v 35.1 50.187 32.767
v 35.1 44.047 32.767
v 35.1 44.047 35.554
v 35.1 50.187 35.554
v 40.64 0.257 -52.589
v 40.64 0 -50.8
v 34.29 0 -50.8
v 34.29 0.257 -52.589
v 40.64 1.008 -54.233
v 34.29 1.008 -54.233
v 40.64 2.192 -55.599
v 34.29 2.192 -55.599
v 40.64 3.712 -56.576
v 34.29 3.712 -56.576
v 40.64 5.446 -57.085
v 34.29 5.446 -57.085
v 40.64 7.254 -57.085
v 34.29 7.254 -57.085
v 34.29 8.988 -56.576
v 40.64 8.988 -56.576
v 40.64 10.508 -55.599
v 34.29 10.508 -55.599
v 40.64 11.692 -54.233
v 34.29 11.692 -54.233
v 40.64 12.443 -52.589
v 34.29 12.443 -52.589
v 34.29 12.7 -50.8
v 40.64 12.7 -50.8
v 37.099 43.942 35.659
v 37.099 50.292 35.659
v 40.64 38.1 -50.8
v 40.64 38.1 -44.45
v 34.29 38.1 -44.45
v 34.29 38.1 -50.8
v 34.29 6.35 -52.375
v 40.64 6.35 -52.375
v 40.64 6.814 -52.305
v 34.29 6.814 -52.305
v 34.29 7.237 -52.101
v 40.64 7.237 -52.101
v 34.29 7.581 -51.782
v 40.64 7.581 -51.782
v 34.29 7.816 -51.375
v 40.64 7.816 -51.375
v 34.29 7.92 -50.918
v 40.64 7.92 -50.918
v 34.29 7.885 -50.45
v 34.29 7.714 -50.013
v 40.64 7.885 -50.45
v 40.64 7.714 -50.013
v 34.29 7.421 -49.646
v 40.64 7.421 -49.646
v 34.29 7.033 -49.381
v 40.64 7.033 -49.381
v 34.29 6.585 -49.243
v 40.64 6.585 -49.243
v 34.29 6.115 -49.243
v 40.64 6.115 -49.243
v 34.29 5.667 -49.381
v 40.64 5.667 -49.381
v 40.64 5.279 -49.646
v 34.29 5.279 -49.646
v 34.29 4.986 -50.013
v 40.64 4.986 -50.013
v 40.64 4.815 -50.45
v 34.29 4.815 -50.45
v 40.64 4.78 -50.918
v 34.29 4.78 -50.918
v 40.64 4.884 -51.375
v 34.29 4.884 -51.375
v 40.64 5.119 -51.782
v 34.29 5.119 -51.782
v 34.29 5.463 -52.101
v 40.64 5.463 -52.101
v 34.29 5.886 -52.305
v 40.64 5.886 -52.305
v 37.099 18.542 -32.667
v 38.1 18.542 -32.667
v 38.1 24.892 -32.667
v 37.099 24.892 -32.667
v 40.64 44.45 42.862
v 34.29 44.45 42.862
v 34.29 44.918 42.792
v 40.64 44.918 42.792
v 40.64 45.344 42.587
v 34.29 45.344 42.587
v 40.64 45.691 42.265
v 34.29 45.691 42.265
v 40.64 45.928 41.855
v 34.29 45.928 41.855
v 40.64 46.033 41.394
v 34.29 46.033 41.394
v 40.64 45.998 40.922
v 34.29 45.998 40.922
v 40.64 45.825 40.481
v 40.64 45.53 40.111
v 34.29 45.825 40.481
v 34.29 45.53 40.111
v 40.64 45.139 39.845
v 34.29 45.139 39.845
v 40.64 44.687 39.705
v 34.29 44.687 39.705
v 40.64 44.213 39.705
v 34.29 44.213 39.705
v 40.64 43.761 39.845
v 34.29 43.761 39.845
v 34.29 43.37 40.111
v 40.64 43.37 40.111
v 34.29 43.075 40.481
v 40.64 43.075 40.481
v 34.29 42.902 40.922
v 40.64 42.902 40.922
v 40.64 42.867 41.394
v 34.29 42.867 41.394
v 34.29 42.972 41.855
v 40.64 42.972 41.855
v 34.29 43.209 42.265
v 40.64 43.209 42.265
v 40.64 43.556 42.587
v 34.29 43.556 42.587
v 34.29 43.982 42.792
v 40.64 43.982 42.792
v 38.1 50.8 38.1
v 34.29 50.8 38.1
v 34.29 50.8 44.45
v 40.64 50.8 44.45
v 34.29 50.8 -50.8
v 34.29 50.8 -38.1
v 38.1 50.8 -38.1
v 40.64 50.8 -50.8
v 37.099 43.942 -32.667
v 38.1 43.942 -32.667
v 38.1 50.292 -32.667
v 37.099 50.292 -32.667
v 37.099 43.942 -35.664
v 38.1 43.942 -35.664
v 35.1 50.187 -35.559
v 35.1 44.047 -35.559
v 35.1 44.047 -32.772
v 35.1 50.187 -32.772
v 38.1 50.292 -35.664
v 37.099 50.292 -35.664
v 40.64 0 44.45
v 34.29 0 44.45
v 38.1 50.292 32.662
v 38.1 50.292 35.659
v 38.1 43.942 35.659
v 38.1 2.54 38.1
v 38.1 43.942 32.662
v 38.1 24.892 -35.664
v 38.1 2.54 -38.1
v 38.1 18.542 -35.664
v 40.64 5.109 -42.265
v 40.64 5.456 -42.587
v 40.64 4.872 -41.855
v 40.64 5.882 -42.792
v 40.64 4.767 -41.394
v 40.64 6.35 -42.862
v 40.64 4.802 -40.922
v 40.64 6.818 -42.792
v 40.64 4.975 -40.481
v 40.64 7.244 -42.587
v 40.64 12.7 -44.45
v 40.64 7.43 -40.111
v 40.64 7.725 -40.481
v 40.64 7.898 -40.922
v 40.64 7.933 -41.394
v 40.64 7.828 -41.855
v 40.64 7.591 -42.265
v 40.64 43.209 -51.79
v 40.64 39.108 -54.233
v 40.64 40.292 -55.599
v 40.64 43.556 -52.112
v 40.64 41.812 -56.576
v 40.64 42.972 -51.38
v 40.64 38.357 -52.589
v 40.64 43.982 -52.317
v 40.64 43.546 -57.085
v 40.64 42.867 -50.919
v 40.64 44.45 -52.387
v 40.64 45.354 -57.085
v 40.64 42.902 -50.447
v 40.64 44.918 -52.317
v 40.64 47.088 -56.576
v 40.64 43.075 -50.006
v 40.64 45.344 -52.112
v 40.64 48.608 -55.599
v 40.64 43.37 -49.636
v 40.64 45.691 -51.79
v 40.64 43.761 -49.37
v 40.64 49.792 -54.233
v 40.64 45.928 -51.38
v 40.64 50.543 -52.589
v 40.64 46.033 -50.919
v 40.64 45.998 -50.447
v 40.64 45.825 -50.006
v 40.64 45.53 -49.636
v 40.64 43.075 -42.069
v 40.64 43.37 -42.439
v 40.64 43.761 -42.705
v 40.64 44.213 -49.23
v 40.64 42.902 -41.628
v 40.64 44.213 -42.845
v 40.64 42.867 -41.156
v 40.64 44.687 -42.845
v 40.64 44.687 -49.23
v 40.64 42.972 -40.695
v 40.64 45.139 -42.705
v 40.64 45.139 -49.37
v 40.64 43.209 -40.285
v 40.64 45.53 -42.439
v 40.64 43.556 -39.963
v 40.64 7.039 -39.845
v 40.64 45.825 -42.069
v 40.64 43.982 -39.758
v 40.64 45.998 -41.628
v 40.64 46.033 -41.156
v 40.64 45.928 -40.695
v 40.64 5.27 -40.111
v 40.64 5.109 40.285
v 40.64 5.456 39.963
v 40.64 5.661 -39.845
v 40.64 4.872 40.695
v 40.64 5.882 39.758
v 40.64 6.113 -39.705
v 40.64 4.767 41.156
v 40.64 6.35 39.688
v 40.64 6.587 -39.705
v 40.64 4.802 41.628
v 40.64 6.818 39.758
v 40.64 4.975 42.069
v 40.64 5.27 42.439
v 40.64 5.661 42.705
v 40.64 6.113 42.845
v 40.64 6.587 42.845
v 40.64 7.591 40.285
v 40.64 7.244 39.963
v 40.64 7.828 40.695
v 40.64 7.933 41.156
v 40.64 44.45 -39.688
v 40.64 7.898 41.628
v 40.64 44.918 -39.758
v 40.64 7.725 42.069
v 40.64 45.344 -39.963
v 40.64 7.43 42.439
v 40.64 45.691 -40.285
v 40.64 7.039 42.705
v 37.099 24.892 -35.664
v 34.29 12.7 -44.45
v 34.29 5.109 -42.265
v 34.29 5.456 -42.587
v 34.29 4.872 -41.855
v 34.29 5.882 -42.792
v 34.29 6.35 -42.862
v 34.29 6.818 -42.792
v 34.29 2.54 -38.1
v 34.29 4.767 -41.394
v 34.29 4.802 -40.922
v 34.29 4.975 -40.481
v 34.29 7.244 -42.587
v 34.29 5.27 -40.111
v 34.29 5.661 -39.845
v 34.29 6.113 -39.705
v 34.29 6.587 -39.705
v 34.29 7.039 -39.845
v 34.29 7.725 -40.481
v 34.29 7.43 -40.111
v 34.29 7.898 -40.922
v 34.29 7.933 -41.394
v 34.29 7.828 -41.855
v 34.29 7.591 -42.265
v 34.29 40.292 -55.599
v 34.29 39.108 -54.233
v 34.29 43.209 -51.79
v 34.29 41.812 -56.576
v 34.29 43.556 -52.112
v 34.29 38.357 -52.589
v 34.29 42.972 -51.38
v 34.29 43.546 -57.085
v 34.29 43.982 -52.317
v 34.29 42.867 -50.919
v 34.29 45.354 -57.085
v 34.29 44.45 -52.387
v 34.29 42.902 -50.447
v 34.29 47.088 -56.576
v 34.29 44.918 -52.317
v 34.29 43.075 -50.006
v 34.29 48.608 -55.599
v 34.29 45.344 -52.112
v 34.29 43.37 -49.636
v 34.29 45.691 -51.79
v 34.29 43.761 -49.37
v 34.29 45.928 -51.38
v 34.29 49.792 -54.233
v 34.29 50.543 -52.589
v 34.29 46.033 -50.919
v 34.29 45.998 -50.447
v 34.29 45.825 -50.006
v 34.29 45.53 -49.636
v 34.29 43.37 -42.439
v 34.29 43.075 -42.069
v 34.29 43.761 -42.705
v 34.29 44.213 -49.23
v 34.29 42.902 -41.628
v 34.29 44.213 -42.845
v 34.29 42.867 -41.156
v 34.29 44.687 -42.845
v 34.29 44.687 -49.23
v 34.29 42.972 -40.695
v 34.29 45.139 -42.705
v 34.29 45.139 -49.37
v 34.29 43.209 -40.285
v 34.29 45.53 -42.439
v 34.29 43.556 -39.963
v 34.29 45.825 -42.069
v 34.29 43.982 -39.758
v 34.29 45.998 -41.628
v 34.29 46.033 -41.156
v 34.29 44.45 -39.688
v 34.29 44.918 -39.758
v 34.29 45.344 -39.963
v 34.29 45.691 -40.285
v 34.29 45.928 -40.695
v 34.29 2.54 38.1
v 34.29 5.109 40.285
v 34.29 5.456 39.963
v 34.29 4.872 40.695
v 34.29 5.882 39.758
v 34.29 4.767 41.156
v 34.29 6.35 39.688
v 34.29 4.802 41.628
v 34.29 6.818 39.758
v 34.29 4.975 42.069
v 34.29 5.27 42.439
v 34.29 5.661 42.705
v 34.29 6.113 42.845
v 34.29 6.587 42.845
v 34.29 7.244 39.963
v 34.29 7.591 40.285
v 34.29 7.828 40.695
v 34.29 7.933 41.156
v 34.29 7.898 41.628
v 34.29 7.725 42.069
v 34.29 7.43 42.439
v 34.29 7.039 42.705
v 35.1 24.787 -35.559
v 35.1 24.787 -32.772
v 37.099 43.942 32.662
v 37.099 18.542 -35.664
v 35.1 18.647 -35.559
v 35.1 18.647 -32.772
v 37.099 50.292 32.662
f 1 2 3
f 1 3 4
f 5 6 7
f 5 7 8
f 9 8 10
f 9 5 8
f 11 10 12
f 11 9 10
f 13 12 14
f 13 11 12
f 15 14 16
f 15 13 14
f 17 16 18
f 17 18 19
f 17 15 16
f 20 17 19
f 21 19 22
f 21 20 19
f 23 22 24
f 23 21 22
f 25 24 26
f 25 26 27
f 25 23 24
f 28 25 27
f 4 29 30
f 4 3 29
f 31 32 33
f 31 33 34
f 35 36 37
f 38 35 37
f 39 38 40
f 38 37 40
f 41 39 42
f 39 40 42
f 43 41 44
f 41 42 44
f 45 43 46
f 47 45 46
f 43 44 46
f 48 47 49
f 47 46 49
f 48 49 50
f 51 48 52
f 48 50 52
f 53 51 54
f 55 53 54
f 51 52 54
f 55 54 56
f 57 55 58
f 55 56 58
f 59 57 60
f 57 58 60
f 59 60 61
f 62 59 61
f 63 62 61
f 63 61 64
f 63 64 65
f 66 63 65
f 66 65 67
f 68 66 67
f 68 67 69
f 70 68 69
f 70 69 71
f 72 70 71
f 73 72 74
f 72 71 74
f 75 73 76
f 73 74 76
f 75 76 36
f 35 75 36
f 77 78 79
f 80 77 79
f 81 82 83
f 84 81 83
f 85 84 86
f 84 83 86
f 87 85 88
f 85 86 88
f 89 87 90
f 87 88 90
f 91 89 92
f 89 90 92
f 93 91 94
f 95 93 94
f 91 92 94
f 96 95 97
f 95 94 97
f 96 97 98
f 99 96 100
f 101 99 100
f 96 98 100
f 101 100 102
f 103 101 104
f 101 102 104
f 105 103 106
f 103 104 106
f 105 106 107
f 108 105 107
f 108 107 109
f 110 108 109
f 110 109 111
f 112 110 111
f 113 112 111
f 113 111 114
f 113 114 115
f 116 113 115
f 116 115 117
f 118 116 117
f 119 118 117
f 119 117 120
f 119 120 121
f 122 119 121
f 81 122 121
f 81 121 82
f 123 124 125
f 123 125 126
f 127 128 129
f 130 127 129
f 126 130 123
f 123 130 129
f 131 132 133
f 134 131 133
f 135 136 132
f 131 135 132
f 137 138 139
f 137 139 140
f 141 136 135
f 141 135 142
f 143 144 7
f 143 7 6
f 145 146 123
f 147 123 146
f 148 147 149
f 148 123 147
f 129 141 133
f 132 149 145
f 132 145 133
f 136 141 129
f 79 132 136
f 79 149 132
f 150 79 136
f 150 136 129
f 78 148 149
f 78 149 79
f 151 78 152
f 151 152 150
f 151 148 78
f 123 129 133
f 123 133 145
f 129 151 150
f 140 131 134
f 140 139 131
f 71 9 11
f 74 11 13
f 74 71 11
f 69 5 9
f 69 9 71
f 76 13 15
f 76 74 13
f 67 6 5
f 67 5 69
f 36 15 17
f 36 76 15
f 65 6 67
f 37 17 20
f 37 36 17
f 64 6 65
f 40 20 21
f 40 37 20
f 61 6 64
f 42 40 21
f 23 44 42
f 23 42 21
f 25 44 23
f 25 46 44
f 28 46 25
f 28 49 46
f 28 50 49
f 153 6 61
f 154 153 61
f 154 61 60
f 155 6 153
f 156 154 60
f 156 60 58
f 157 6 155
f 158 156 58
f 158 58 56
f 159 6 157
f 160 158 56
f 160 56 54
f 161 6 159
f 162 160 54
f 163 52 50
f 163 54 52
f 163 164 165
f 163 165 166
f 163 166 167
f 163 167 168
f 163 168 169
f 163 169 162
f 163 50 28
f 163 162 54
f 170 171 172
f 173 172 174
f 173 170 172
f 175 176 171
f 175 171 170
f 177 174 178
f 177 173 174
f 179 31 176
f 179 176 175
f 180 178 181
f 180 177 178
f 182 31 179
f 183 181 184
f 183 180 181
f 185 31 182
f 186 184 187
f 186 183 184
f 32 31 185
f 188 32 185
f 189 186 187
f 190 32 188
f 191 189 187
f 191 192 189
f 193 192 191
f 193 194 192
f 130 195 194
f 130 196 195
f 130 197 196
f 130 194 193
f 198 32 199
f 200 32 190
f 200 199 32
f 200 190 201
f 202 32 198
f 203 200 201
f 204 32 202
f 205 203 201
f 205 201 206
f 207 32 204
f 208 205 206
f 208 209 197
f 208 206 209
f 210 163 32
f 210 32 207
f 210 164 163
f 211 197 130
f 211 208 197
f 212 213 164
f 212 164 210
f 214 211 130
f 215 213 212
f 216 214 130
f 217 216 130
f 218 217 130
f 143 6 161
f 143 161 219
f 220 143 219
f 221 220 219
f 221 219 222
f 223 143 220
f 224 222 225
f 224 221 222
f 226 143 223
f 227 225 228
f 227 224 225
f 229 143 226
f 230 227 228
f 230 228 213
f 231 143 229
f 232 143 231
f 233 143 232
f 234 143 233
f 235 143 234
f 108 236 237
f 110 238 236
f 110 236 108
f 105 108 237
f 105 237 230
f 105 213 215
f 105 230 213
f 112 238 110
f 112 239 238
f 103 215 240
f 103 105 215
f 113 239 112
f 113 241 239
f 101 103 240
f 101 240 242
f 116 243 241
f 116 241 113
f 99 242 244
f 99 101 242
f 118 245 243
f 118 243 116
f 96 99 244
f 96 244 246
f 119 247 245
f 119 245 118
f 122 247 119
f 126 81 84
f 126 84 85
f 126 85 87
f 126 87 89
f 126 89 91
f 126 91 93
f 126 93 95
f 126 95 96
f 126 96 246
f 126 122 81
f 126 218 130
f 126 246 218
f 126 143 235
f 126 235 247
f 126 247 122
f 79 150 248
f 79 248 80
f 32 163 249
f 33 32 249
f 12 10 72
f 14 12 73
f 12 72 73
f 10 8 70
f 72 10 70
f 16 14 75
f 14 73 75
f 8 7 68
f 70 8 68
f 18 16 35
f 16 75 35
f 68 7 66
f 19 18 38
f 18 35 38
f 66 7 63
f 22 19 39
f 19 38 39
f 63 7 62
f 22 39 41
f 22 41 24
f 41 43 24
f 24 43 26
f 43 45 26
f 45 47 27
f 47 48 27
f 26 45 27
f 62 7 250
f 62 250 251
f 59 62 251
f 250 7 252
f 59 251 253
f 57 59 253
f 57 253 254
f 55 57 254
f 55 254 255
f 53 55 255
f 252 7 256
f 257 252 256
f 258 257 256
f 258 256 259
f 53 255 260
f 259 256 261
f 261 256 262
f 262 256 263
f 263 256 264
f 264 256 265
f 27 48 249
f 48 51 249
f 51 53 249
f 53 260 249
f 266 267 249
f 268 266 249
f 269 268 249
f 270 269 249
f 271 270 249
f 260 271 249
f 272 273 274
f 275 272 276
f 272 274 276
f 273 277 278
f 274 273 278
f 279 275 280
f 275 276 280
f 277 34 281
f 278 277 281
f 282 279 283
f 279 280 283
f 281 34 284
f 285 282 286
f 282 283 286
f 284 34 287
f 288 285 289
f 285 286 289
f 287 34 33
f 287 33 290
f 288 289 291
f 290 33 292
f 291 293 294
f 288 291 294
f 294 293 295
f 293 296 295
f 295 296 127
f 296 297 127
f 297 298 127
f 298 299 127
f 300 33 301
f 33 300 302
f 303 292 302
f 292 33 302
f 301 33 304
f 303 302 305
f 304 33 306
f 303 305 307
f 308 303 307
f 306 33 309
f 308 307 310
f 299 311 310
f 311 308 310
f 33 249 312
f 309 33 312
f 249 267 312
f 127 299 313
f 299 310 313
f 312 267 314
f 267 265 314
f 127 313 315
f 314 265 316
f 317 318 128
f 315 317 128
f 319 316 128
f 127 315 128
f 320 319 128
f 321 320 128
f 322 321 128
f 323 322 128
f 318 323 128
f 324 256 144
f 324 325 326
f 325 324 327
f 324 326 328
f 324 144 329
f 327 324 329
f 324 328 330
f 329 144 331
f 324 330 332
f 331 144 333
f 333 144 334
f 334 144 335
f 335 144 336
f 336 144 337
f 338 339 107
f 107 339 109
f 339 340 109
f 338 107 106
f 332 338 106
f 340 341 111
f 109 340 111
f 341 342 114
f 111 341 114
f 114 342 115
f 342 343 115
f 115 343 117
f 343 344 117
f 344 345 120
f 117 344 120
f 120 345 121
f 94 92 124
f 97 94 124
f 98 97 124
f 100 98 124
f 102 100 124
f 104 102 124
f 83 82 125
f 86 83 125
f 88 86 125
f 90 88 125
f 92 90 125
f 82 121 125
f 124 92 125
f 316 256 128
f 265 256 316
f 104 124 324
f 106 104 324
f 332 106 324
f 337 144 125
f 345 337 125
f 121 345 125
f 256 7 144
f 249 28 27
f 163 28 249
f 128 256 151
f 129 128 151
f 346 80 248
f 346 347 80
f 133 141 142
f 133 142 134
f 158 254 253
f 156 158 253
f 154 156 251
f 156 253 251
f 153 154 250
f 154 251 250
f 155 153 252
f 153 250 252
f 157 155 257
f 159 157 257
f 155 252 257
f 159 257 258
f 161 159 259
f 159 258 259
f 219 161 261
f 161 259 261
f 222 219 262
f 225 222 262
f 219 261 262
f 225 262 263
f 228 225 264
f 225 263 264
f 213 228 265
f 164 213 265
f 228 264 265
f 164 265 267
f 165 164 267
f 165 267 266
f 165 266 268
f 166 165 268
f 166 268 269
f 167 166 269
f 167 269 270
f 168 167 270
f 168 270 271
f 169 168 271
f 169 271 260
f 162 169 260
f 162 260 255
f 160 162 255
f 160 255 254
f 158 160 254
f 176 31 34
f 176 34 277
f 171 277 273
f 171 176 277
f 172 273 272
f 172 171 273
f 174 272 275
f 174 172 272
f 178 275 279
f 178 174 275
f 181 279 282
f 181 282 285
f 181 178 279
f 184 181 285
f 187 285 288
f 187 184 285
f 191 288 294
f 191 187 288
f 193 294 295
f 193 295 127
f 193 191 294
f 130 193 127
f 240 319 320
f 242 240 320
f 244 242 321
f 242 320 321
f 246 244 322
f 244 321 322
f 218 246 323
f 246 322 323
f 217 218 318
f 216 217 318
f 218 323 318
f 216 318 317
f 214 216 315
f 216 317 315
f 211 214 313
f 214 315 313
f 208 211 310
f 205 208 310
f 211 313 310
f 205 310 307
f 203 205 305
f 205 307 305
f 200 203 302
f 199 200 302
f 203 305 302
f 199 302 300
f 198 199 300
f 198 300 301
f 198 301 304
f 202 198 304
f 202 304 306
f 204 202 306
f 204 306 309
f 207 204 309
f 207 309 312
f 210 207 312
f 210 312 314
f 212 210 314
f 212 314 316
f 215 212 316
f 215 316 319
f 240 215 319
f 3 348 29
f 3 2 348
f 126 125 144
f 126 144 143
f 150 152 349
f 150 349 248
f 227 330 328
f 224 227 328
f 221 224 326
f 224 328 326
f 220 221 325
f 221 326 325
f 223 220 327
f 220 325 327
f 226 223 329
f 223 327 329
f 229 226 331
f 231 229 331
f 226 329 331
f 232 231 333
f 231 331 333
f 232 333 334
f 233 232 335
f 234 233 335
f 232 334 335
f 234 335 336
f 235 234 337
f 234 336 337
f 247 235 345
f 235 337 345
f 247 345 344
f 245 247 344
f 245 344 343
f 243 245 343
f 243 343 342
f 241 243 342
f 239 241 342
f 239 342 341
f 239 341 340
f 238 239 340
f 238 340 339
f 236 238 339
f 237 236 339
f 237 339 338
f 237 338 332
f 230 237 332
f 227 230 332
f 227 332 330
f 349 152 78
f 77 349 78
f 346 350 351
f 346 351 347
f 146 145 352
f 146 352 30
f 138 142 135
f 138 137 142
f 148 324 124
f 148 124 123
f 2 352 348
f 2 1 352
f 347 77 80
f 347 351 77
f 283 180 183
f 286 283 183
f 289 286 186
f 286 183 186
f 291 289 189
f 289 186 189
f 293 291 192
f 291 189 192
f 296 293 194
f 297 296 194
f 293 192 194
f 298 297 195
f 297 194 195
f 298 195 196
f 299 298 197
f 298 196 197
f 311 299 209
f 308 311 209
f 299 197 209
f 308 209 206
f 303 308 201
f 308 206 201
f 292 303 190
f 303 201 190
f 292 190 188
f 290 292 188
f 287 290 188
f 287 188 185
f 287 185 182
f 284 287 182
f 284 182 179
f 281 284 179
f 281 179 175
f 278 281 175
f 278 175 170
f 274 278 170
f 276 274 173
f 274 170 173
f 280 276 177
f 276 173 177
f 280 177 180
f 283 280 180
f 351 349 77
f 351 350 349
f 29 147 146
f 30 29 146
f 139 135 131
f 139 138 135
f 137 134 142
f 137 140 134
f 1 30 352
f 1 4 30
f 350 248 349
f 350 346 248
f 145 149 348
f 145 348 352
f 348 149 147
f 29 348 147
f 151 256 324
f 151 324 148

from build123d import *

# Parameters (mm, degrees)
SKETCH1_W            = 81.28
SKETCH1_H            = 81.28
SKETCH1_W_2          = 76.2
SKETCH1_H_2          = 76.2
BOSS_EXTRUDE1_DEPTH  = 50.8
SKETCH2_W            = 3.81
SKETCH2_H            = 76.2
BOSS_EXTRUDE2_DEPTH  = 2.54
SKETCH3_R            = 1.5748
BOSS_EXTRUDE3_DEPTH  = 6.35
SKETCH4_R            = 1.5875
BOSS_EXTRUDE4_DEPTH  = 6.35
SKETCH6_W            = 74.93
SKETCH6_H            = 50.8
CUT_EXTRUDE1_DEPTH   = 118.45268707
SKETCH7_W            = 2.9972
SKETCH7_H            = 6.35
BOSS_EXTRUDE5_DEPTH  = 1.00076
SKETCH8_W            = 2.9972
SKETCH8_H            = 6.35
BOSS_EXTRUDE6_DEPTH  = 1.99898
BOSS_EXTRUDE6_TAPER  = 3
LPATTERN1_COUNT      = 4
LPATTERN1_PITCH      = 12.7
LPATTERN1_COUNT_DIR2 = 2
LPATTERN1_PITCH_DIR2 = 68.326
SKETCH9_W            = 6.35
SKETCH9_H            = 50.8
BOSS_EXTRUDE7_DEPTH  = 3.81
SKETCH10_R           = 1.5875
CUT_EXTRUDE2_DEPTH   = 77.727341932
SKETCH12_W           = 4.993400043
SKETCH12_H           = 34.528830081
SKETCH12_W_2         = 6.055825583
SKETCH12_H_2         = 9.668072422
SKETCH12_H_3         = 8.28691922
CUT_EXTRUDE3_DEPTH   = 3.81
SKETCH13_W           = 6.35
SKETCH13_H           = 25.4
BOSS_EXTRUDE8_DEPTH  = 3.81
LPATTERN2_COUNT      = 2
LPATTERN2_PITCH      = 82.55


with BuildPart() as part:
    # Sketch1 → Boss-Extrude1 (new body)
    with BuildSketch(Plane(origin=(0, 0, 0), x_dir=(1, 0, 0), z_dir=(0, 1, 0))):
        Rectangle(SKETCH1_W, SKETCH1_H)
        Rectangle(SKETCH1_W_2, SKETCH1_H_2, mode=Mode.SUBTRACT)
    extrude(amount=BOSS_EXTRUDE1_DEPTH)

    # Sketch2 → Boss-Extrude2 (add)
    with BuildSketch(Plane(origin=(0, 0, 0), x_dir=(1, 0, 0), z_dir=(0, 1, 0))):
        with Locations((-36.195, 0)):
            Rectangle(SKETCH2_W, SKETCH2_H)
        with Locations((36.195, 0)):
            Rectangle(SKETCH2_W, SKETCH2_H)
    extrude(amount=BOSS_EXTRUDE2_DEPTH)

    # Sketch3 → Boss-Extrude3 (add)
    with BuildSketch(Plane(origin=(40.64, 0, 0), x_dir=(0, 0, -1), z_dir=(1, 0, 0))):
        with BuildLine():
            Line((50.8, 12.7), (40.64, 12.7))
            Line((40.64, 12.7), (40.64, 0))
            Line((40.64, 0), (50.8, 0))
            ThreePointArc((50.8, 0), (57.15, 6.35), (50.8, 12.7))
        make_face()
        with Locations((50.8, 6.35)):
            Circle(SKETCH3_R, mode=Mode.SUBTRACT)
    boss_extrude3 = extrude(amount=-BOSS_EXTRUDE3_DEPTH)

    # Sketch4 → Boss-Extrude4 (add)
    with BuildSketch(Plane(origin=(40.64, 0, 0), x_dir=(0, 0, -1), z_dir=(1, 0, 0))):
        with BuildLine():
            Line((50.8, 50.8), (40.64, 50.8))
            Line((40.64, 50.8), (40.64, 38.1))
            Line((40.64, 38.1), (50.8, 38.1))
            ThreePointArc((50.8, 38.1), (57.15, 44.45), (50.8, 50.8))
        make_face()
        with Locations((50.8, 44.45)):
            Circle(SKETCH4_R, mode=Mode.SUBTRACT)
    boss_extrude4 = extrude(amount=-BOSS_EXTRUDE4_DEPTH)

    # Mirror1: Boss-Extrude3, Boss-Extrude4 across plane
    add(boss_extrude3.mirror(Plane.ZY))
    add(boss_extrude4.mirror(Plane.ZY))

    # Sketch6 → Cut-Extrude1 (cut, through all)
    with BuildSketch(Plane.XY.offset(40.64)):
        with Locations((-3.175, 25.4)):
            Rectangle(SKETCH6_W, SKETCH6_H)
    extrude(amount=-CUT_EXTRUDE1_DEPTH, mode=Mode.SUBTRACT)

    # Sketch7 → Boss-Extrude5 (add)
    with BuildSketch(Plane.ZY.offset(-38.1)):
        with Locations((-34.16554, 9.017)):
            Rectangle(SKETCH7_W, SKETCH7_H)
    boss_extrude5 = extrude(amount=BOSS_EXTRUDE5_DEPTH)

    # Sketch8 → Boss-Extrude6 (add)
    with BuildSketch(Plane.ZY.offset(-37.09924)):
        with Locations((-34.16554, 9.017)):
            Rectangle(SKETCH8_W, SKETCH8_H)
    boss_extrude6 = extrude(amount=BOSS_EXTRUDE6_DEPTH, taper=BOSS_EXTRUDE6_TAPER)

    # LPattern1: Boss-Extrude5, Boss-Extrude6 4 × 2
    with Locations(*[(0, i * LPATTERN1_PITCH, j * LPATTERN1_PITCH_DIR2) for i in range(LPATTERN1_COUNT) for j in range(LPATTERN1_COUNT_DIR2) if (i, j) != (0, 0)]):
        add(boss_extrude5)
        add(boss_extrude6)

    # Sketch9 → Boss-Extrude7 (add)
    with BuildSketch(Plane(origin=(34.29, 50.8, 40.64), x_dir=(1, 0, 0), z_dir=(0, 0, 1))):
        with Locations((3.175, -25.4)):
            Rectangle(SKETCH9_W, SKETCH9_H)
    extrude(amount=BOSS_EXTRUDE7_DEPTH)

    # Sketch10 → Cut-Extrude2 (cut, through all)
    with BuildSketch(Plane.ZY.offset(-34.29)):
        with Locations((41.275, 44.45)):
            Circle(SKETCH10_R)
        with Locations((41.275, 6.35)):
            Circle(SKETCH10_R)
    cut_extrude2 = extrude(amount=-CUT_EXTRUDE2_DEPTH, mode=Mode.SUBTRACT)

    # Sketch12 → Cut-Extrude3 (cut)
    with BuildSketch(Plane.ZY.offset(-34.29)):
        with Locations((33.961683306, 21.990472175)):
            Rectangle(SKETCH12_W, SKETCH12_H)
        with Locations((-34.13979387, 34.420851005)):
            Rectangle(SKETCH12_W_2, SKETCH12_H_2)
        with Locations((-34.13979387, 8.869516745)):
            Rectangle(SKETCH12_W_2, SKETCH12_H_3)
    extrude(amount=-CUT_EXTRUDE3_DEPTH, mode=Mode.SUBTRACT)

    # Sketch13 → Boss-Extrude8 (add)
    with BuildSketch(Plane(origin=(0, 0, -40.64), x_dir=(-1, 0, 0), z_dir=(0, 0, -1))):
        with Locations((-37.465, 25.4)):
            Rectangle(SKETCH13_W, SKETCH13_H)
    extrude(amount=BOSS_EXTRUDE8_DEPTH)

    # LPattern2: Cut-Extrude2 ×2
    with Locations(*[(0, 0, -i * LPATTERN2_PITCH) for i in range(1, LPATTERN2_COUNT)]):
        add(cut_extrude2, mode=Mode.SUBTRACT)


solid = part.part
